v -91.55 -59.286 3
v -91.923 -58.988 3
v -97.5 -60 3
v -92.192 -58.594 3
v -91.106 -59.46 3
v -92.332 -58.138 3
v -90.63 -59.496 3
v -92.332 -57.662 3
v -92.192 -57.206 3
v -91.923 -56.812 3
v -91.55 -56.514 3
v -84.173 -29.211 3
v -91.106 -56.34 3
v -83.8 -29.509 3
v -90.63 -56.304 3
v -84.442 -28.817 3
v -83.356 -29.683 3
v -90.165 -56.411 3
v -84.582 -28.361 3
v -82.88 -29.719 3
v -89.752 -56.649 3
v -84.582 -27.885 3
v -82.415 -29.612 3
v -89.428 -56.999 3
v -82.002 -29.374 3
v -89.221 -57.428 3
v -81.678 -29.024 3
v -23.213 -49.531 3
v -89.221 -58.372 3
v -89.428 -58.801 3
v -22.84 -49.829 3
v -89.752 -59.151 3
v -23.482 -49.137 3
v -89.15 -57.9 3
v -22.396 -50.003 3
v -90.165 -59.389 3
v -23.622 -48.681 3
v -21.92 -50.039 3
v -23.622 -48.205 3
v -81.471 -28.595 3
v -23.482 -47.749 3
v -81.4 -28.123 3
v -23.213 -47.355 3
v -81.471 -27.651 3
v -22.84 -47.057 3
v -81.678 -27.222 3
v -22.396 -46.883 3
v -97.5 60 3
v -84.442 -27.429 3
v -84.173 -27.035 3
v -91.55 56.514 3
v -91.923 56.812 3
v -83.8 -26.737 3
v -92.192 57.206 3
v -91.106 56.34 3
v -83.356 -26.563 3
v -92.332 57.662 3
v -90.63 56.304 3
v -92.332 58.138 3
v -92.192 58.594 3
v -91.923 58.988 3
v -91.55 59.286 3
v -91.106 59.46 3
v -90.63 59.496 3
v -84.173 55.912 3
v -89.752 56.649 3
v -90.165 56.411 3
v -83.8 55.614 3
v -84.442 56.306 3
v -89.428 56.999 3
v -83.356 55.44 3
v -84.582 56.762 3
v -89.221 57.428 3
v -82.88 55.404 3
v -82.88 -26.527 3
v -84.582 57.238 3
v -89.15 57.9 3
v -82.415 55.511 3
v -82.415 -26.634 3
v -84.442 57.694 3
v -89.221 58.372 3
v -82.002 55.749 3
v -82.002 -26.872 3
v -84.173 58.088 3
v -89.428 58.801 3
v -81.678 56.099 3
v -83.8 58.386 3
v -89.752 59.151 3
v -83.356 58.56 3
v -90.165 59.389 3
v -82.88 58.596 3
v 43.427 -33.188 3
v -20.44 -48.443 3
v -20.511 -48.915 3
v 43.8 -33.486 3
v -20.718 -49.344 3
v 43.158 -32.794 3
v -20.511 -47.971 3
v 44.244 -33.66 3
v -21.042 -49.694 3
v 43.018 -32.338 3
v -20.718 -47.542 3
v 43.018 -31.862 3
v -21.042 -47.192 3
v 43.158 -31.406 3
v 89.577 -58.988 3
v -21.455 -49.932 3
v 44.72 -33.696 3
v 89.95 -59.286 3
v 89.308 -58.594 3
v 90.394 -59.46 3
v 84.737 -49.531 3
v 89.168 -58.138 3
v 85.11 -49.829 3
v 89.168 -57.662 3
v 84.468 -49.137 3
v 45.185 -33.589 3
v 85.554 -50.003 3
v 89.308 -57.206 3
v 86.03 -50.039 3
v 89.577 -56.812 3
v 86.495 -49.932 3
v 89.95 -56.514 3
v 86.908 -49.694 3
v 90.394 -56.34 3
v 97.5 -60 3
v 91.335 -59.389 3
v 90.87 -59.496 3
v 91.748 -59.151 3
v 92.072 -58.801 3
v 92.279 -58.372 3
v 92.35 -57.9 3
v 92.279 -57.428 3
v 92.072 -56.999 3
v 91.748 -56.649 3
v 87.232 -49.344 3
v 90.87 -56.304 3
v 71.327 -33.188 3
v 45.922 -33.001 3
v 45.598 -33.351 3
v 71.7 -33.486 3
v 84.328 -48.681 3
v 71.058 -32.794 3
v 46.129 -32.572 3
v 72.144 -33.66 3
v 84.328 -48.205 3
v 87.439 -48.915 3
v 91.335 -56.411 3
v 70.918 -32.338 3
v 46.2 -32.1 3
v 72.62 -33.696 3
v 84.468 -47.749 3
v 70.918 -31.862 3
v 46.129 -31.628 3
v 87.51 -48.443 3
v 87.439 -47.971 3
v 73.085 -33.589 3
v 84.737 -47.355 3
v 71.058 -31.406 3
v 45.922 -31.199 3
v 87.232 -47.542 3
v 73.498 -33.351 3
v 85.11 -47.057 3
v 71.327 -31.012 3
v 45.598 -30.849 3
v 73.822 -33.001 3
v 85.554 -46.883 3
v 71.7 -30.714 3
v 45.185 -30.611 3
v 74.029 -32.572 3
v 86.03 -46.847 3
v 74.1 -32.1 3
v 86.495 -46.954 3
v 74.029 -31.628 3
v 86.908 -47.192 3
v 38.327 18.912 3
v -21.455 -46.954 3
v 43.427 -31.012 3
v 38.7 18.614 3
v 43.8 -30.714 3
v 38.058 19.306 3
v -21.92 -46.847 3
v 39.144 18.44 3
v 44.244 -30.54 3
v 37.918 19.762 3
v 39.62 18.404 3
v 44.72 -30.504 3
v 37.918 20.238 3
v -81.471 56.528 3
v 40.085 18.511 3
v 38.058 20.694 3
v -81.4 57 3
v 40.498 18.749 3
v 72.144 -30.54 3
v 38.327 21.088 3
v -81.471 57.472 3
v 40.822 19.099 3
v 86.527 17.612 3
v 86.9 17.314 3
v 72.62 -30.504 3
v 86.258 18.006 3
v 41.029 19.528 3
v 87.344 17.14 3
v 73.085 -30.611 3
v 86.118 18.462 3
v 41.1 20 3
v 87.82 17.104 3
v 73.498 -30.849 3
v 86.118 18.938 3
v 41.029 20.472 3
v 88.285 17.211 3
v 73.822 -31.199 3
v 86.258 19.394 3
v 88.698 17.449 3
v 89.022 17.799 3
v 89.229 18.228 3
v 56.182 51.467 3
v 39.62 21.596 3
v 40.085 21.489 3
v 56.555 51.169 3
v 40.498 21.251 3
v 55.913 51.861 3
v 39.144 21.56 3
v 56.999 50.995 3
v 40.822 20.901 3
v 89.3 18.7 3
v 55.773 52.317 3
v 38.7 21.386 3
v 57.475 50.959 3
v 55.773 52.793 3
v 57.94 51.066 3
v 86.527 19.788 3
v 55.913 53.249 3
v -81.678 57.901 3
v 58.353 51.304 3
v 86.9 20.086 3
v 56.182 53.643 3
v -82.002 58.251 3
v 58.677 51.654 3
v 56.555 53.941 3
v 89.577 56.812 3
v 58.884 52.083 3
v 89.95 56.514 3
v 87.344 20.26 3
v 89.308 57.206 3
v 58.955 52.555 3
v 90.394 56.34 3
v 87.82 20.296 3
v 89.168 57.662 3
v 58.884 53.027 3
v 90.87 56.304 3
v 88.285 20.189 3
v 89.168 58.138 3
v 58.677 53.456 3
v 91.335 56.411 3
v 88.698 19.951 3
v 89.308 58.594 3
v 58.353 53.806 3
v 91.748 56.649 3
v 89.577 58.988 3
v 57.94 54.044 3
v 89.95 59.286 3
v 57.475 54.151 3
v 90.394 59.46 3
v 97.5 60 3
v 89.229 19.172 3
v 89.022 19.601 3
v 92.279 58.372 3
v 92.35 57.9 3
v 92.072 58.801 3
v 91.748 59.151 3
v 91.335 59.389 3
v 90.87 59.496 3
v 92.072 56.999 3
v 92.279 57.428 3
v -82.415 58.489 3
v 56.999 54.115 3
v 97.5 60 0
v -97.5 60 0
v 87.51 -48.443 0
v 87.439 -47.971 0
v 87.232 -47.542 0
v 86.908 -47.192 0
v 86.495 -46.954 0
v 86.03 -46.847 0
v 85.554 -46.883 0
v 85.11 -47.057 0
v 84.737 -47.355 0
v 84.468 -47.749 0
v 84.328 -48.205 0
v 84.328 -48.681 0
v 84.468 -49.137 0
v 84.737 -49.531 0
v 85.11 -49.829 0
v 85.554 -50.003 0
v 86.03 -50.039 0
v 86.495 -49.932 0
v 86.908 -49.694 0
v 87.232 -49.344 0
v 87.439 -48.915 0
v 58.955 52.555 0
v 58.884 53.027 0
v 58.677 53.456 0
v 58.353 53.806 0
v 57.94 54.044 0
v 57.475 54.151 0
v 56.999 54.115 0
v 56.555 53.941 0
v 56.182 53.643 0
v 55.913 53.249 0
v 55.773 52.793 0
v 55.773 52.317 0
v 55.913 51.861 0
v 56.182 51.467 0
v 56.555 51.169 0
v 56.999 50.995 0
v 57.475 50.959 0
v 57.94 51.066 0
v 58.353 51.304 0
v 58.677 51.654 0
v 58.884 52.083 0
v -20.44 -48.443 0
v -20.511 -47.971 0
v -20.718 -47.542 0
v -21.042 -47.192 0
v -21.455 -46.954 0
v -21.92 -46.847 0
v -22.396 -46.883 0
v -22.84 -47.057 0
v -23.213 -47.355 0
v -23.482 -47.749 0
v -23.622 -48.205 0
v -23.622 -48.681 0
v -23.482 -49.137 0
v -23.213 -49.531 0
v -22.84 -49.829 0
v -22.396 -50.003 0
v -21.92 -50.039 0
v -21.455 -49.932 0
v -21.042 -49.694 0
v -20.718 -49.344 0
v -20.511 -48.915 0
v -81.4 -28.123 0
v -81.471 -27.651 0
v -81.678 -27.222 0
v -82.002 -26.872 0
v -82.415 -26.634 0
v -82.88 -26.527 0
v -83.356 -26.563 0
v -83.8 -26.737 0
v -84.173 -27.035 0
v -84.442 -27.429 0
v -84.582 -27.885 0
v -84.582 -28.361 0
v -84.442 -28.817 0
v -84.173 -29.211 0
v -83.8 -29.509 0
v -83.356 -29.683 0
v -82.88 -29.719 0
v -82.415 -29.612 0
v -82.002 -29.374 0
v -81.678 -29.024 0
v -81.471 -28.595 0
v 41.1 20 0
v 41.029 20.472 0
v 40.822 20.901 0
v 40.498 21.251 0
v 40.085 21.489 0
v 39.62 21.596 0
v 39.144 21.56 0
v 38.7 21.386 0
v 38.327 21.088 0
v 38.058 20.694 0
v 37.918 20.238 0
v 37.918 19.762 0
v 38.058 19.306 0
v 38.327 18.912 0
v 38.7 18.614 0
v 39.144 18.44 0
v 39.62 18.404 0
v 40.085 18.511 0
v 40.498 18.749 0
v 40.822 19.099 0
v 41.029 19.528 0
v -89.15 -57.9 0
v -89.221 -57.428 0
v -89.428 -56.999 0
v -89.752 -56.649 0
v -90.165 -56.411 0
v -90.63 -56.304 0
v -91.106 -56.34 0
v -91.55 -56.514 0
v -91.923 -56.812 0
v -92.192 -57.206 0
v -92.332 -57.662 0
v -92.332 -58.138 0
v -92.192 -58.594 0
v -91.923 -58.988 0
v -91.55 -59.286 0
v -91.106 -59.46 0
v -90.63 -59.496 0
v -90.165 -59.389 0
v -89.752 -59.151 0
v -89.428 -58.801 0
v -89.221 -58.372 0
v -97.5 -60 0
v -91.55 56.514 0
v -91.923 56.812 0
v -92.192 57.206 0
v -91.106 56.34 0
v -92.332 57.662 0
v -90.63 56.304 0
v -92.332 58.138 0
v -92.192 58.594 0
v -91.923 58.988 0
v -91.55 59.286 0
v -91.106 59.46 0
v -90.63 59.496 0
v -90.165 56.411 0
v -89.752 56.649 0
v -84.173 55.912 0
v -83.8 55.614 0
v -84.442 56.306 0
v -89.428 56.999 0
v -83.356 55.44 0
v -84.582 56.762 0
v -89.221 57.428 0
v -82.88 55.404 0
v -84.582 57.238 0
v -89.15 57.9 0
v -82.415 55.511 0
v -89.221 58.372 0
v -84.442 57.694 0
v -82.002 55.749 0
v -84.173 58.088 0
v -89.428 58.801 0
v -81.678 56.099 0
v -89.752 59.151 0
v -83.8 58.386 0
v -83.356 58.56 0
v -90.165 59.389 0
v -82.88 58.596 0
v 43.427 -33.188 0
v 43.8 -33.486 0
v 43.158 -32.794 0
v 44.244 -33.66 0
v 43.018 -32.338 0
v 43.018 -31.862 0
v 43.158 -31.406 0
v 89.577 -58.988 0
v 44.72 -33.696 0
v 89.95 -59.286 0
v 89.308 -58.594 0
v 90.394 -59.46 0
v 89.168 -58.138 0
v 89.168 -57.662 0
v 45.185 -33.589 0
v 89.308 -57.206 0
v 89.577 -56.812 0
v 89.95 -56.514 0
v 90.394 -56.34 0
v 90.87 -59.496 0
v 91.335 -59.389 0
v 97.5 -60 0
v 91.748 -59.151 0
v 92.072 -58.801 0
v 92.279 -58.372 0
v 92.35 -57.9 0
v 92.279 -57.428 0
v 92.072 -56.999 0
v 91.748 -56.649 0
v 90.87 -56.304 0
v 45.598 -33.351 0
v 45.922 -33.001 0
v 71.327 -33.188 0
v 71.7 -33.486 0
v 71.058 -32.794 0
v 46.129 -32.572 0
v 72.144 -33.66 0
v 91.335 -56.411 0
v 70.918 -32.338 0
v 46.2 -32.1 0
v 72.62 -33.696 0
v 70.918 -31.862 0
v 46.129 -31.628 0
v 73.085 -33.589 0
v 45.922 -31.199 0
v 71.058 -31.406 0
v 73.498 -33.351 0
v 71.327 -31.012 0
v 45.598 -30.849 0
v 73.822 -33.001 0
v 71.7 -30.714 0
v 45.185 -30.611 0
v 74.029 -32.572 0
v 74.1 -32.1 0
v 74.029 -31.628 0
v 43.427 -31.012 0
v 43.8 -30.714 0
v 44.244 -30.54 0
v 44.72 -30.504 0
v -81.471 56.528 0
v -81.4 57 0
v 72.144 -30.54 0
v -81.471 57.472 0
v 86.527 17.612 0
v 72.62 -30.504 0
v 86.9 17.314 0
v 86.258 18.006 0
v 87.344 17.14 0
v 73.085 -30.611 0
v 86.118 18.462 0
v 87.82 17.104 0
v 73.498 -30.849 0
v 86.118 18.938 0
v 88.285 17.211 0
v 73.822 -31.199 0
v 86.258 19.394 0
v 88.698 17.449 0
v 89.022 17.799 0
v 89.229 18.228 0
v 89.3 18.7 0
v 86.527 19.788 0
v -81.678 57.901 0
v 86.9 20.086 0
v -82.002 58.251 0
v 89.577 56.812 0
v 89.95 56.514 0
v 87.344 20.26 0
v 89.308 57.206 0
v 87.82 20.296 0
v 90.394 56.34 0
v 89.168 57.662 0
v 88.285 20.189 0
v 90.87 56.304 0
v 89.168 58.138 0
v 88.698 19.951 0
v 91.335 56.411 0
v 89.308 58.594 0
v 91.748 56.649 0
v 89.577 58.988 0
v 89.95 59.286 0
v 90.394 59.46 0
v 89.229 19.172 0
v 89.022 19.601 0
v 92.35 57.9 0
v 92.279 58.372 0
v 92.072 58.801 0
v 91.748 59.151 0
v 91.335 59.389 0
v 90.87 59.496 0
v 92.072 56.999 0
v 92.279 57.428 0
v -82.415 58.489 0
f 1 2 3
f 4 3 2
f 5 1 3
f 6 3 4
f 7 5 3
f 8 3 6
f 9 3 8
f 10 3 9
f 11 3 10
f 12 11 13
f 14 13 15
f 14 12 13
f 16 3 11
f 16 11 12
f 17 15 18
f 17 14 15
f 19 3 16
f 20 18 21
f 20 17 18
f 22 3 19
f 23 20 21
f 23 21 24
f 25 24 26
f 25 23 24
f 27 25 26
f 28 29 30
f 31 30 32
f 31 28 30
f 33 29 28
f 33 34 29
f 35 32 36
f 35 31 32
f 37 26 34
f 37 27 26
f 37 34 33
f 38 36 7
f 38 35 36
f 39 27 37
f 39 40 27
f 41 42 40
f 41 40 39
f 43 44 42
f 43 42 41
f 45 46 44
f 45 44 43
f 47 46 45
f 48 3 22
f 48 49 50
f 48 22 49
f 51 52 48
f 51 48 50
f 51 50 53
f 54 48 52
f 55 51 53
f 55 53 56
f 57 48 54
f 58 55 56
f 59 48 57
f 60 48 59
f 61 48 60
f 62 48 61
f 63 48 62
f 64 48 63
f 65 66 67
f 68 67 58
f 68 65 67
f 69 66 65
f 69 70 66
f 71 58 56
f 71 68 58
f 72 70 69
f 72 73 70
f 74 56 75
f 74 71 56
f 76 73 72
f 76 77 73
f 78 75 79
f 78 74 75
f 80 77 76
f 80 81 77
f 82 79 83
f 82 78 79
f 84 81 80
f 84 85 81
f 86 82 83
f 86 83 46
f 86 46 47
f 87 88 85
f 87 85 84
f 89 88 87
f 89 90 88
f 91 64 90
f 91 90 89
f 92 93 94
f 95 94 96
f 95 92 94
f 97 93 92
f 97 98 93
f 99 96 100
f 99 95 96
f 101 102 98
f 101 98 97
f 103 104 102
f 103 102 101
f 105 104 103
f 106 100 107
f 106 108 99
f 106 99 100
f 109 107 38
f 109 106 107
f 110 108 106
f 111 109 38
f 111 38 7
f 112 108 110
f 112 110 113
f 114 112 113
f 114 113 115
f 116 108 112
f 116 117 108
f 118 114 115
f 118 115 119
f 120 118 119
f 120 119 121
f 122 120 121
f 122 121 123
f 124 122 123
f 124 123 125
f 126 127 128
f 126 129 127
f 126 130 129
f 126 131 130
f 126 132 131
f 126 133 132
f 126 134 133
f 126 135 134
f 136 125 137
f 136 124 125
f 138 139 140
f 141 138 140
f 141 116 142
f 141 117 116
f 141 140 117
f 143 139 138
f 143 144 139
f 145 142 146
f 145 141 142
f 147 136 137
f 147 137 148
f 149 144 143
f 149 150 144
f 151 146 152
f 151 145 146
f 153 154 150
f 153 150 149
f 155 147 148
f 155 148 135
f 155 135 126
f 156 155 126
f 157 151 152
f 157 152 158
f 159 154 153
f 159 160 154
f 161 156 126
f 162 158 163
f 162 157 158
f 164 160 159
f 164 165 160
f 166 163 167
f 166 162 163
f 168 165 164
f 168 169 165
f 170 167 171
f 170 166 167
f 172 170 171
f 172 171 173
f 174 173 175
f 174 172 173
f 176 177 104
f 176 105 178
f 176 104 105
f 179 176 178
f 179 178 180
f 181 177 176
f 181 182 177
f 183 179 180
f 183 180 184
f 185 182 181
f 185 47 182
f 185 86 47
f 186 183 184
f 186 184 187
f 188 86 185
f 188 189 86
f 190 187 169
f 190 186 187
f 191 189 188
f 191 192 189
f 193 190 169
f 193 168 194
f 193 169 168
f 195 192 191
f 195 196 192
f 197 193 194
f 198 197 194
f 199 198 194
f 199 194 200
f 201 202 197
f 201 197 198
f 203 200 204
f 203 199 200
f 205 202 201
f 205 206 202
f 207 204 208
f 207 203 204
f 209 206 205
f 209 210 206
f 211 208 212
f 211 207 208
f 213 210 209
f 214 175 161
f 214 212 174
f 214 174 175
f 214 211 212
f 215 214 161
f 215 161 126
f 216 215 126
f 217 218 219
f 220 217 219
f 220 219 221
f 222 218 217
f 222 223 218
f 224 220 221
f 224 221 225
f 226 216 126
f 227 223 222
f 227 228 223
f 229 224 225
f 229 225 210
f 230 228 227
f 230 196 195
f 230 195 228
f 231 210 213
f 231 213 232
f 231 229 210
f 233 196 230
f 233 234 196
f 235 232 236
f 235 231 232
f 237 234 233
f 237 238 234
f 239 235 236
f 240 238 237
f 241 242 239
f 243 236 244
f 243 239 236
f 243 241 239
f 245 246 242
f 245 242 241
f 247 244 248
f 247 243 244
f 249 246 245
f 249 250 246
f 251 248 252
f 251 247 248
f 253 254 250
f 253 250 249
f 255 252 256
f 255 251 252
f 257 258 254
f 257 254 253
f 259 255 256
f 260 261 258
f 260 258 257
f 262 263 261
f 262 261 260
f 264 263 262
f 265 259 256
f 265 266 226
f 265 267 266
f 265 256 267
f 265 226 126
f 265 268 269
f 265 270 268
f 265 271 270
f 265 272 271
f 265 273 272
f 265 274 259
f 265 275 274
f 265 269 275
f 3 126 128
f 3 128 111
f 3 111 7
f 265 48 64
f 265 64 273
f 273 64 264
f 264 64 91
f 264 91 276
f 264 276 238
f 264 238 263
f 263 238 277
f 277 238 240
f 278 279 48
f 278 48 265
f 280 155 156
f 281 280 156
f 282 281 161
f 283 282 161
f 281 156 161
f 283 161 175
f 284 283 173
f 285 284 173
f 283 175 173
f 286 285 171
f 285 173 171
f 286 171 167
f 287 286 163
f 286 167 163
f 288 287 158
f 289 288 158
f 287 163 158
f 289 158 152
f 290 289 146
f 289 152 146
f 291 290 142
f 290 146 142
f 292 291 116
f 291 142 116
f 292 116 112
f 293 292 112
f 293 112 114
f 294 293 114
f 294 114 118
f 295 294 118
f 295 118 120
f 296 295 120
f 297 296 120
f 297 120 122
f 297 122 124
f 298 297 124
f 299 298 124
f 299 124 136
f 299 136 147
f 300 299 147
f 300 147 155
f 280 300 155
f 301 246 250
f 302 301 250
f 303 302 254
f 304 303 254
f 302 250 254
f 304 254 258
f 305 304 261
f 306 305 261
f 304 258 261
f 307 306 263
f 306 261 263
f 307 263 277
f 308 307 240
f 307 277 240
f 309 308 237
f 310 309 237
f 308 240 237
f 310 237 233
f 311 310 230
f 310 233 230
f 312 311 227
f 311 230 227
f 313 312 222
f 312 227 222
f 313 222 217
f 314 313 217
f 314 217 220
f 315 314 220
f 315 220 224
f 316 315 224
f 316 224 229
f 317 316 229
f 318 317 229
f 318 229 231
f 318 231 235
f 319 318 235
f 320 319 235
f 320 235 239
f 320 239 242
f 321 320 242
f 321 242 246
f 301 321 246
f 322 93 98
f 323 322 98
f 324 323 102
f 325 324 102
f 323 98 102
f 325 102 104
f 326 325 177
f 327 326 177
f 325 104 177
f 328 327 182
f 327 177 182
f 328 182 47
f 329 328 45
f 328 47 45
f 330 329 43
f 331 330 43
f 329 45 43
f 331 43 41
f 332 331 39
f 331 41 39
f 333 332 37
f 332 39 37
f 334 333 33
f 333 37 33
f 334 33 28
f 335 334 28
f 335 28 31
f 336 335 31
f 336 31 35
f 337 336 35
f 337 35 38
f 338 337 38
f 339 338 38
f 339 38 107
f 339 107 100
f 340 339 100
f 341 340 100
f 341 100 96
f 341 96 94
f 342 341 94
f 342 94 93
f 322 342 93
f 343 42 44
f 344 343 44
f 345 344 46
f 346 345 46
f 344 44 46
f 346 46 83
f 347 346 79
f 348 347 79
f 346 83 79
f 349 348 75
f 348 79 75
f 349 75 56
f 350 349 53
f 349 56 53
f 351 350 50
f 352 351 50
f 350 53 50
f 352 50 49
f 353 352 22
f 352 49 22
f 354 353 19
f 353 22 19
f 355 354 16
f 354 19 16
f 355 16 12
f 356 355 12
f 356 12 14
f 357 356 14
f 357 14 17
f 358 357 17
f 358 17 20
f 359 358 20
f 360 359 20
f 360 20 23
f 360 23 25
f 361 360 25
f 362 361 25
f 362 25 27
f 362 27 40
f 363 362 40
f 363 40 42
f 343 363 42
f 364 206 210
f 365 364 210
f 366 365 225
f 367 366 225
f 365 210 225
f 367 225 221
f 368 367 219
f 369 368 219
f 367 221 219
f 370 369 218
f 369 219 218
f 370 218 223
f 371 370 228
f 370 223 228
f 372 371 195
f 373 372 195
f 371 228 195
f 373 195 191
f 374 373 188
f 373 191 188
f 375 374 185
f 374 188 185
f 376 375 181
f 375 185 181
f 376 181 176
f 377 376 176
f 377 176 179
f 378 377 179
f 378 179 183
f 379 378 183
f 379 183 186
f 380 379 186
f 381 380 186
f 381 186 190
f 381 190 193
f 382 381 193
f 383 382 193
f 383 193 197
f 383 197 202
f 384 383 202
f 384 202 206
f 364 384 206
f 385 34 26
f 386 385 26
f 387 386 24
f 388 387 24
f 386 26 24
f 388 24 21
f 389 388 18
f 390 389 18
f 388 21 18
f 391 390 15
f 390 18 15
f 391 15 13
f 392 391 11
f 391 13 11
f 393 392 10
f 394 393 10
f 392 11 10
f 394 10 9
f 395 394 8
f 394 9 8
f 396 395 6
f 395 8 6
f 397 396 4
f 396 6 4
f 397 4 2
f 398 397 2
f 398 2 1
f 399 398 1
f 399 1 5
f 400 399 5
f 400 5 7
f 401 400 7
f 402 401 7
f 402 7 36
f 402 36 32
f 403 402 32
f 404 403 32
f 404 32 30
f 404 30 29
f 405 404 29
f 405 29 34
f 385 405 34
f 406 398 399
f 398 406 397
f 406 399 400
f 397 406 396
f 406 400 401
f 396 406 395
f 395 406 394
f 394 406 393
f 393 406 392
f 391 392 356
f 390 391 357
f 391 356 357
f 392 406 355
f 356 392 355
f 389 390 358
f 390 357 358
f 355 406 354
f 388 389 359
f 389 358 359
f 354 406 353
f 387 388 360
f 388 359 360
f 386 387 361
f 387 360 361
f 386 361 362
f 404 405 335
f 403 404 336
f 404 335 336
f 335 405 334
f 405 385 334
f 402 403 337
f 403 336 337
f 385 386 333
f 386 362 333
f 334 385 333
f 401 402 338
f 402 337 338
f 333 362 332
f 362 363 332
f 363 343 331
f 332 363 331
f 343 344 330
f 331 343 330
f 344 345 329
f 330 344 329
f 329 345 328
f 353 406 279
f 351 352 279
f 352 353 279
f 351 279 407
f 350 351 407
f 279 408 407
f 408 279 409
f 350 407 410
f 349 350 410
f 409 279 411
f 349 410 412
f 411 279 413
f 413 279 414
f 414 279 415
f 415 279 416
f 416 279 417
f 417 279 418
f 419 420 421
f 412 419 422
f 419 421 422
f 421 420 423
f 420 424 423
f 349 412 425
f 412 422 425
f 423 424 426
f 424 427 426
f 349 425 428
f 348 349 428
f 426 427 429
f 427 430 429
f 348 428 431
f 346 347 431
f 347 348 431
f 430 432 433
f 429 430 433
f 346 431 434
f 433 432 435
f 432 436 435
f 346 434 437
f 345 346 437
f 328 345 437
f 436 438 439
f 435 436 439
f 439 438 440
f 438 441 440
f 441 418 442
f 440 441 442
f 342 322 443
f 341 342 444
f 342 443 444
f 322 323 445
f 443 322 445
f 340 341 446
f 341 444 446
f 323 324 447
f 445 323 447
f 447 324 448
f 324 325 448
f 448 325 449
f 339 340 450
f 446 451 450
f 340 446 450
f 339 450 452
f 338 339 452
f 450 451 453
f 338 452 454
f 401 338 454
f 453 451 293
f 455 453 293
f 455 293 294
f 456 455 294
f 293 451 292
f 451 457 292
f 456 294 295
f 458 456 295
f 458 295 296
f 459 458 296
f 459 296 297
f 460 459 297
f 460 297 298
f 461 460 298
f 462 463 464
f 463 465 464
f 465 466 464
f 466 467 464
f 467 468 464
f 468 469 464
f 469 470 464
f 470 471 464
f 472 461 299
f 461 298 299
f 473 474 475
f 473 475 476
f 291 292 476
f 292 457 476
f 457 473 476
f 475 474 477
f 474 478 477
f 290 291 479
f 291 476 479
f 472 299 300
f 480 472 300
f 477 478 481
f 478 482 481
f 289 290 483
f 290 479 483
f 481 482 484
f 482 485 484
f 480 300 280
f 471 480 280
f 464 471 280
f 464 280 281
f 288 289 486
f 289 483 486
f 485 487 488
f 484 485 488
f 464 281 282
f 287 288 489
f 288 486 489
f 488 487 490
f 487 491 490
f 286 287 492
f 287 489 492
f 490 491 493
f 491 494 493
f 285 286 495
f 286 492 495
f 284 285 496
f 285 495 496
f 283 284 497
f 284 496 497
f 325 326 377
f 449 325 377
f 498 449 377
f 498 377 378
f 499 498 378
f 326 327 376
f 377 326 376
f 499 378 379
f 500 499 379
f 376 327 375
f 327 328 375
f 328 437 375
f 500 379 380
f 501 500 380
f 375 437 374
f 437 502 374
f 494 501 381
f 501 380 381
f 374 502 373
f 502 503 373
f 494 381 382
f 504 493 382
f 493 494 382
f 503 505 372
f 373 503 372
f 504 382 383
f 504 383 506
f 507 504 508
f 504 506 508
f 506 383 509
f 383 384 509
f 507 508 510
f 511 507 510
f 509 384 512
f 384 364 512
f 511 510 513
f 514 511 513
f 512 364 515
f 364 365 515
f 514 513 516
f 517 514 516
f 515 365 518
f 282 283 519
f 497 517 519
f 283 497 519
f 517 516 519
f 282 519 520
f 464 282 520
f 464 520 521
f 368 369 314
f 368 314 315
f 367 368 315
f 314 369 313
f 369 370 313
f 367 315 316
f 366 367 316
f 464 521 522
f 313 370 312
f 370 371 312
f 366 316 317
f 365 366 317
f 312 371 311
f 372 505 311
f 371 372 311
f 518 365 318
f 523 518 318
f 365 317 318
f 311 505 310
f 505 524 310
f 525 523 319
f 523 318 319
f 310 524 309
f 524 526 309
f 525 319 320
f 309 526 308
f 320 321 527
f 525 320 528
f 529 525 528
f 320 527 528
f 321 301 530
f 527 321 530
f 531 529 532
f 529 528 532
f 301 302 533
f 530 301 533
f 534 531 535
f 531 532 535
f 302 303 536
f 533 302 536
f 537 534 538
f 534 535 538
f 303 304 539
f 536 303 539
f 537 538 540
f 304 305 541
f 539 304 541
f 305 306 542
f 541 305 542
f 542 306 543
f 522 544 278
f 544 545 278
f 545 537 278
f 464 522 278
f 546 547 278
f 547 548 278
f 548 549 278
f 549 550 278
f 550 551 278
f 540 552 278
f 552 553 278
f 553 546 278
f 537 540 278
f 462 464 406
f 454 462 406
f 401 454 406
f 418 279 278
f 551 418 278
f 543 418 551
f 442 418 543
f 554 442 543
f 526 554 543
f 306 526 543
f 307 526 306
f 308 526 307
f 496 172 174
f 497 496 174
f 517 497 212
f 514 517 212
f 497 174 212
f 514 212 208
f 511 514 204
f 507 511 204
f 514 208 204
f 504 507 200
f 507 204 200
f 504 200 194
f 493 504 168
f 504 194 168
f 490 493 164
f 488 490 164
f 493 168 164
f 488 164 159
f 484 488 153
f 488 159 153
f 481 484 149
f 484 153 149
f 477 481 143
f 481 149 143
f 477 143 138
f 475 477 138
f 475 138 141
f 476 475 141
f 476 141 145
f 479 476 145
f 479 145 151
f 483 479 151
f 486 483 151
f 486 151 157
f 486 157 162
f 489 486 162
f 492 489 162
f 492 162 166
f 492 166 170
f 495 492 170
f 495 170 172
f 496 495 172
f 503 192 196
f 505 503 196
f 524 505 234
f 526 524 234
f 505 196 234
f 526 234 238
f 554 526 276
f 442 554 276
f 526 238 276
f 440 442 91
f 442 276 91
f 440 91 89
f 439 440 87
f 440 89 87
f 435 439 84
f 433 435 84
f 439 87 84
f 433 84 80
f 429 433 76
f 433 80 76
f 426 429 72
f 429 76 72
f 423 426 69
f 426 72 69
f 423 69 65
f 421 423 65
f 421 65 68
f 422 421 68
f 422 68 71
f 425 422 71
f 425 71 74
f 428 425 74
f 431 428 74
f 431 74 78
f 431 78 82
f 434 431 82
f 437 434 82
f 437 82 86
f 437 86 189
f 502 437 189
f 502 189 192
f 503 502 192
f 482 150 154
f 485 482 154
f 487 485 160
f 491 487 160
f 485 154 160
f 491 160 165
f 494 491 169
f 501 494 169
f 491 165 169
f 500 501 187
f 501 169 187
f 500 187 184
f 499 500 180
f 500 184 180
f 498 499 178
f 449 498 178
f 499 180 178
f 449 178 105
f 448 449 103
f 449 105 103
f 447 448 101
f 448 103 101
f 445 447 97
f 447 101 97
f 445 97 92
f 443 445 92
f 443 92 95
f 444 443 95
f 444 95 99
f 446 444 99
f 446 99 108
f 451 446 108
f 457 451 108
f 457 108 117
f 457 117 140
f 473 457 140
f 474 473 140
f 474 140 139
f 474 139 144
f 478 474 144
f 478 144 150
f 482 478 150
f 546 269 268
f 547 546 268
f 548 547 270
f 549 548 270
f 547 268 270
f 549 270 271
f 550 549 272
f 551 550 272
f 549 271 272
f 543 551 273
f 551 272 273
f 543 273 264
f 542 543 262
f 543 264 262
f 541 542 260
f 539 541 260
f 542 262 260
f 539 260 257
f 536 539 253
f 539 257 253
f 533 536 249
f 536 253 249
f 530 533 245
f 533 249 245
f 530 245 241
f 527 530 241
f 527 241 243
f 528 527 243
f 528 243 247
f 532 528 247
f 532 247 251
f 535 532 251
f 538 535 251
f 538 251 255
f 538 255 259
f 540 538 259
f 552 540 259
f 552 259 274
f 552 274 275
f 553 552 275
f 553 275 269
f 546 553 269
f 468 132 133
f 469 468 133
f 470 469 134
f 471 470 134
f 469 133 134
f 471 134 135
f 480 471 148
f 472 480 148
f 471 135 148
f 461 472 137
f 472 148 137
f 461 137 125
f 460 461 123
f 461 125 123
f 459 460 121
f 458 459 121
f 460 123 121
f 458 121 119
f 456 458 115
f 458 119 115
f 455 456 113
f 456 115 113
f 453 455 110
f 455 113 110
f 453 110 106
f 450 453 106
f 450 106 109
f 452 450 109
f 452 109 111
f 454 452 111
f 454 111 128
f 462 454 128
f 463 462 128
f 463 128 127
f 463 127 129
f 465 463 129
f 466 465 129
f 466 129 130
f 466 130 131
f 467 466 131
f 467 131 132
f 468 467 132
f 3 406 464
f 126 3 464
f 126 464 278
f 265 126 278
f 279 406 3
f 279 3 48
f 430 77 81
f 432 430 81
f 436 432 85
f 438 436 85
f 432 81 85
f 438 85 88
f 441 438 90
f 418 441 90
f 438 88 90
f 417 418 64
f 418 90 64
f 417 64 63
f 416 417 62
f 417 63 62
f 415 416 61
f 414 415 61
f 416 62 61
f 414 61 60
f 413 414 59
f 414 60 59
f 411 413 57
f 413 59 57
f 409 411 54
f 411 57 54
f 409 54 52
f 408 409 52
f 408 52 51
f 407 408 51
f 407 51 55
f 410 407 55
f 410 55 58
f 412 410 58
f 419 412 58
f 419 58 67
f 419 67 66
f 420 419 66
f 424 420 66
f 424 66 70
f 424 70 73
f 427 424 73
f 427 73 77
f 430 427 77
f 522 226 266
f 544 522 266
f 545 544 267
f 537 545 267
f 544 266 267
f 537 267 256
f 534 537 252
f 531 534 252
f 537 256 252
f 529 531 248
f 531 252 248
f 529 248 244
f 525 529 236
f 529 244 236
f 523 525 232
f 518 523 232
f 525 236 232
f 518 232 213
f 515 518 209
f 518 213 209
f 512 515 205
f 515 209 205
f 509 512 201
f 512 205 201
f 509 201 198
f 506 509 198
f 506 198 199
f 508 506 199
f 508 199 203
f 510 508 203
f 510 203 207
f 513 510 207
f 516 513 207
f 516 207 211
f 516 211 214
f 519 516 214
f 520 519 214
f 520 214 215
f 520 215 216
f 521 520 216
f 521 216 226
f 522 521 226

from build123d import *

# Parameters (mm, degrees)
SKETCH_W        = 195
SKETCH_H        = 120
PAD_DEPTH       = 3
SKETCH001_R     = 1.6
POCKET_DEPTH    = 5
SKETCH002_R     = 1.6
POCKET001_DEPTH = 5


with BuildPart() as part:
    # Sketch → Pad (new body)
    with BuildSketch(Plane.XY):
        Rectangle(SKETCH_W, SKETCH_H)
    extrude(amount=PAD_DEPTH)

    # Sketch001 → Pocket (cut)
    with BuildSketch(Plane.XY.offset(3)):
        with Locations((-90.75, 57.9)):
            Circle(SKETCH001_R)
        with Locations((90.75, 57.9)):
            Circle(SKETCH001_R)
        with Locations((-90.75, -57.9)):
            Circle(SKETCH001_R)
        with Locations((90.75, -57.9)):
            Circle(SKETCH001_R)
    extrude(amount=-POCKET_DEPTH, mode=Mode.SUBTRACT)

    # Sketch002 → Pocket001 (cut)
    with BuildSketch(Plane.XY.offset(3)):
        with Locations((-83, 57)):
            Circle(SKETCH002_R)
        with Locations((57.355, 52.555)):
            Circle(SKETCH002_R)
        with Locations((-83, -28.123)):
            Circle(SKETCH002_R)
        with Locations((-22.04, -48.443)):
            Circle(SKETCH002_R)
        with Locations((85.91, -48.443)):
            Circle(SKETCH002_R)
        with Locations((39.5, 20)):
            Circle(SKETCH002_R)
        with Locations((44.6, -32.1)):
            Circle(SKETCH002_R)
        with Locations((72.5, -32.1)):
            Circle(SKETCH002_R)
        with Locations((87.7, 18.7)):
            Circle(SKETCH002_R)
    extrude(amount=-POCKET001_DEPTH, mode=Mode.SUBTRACT)


solid = part.part
